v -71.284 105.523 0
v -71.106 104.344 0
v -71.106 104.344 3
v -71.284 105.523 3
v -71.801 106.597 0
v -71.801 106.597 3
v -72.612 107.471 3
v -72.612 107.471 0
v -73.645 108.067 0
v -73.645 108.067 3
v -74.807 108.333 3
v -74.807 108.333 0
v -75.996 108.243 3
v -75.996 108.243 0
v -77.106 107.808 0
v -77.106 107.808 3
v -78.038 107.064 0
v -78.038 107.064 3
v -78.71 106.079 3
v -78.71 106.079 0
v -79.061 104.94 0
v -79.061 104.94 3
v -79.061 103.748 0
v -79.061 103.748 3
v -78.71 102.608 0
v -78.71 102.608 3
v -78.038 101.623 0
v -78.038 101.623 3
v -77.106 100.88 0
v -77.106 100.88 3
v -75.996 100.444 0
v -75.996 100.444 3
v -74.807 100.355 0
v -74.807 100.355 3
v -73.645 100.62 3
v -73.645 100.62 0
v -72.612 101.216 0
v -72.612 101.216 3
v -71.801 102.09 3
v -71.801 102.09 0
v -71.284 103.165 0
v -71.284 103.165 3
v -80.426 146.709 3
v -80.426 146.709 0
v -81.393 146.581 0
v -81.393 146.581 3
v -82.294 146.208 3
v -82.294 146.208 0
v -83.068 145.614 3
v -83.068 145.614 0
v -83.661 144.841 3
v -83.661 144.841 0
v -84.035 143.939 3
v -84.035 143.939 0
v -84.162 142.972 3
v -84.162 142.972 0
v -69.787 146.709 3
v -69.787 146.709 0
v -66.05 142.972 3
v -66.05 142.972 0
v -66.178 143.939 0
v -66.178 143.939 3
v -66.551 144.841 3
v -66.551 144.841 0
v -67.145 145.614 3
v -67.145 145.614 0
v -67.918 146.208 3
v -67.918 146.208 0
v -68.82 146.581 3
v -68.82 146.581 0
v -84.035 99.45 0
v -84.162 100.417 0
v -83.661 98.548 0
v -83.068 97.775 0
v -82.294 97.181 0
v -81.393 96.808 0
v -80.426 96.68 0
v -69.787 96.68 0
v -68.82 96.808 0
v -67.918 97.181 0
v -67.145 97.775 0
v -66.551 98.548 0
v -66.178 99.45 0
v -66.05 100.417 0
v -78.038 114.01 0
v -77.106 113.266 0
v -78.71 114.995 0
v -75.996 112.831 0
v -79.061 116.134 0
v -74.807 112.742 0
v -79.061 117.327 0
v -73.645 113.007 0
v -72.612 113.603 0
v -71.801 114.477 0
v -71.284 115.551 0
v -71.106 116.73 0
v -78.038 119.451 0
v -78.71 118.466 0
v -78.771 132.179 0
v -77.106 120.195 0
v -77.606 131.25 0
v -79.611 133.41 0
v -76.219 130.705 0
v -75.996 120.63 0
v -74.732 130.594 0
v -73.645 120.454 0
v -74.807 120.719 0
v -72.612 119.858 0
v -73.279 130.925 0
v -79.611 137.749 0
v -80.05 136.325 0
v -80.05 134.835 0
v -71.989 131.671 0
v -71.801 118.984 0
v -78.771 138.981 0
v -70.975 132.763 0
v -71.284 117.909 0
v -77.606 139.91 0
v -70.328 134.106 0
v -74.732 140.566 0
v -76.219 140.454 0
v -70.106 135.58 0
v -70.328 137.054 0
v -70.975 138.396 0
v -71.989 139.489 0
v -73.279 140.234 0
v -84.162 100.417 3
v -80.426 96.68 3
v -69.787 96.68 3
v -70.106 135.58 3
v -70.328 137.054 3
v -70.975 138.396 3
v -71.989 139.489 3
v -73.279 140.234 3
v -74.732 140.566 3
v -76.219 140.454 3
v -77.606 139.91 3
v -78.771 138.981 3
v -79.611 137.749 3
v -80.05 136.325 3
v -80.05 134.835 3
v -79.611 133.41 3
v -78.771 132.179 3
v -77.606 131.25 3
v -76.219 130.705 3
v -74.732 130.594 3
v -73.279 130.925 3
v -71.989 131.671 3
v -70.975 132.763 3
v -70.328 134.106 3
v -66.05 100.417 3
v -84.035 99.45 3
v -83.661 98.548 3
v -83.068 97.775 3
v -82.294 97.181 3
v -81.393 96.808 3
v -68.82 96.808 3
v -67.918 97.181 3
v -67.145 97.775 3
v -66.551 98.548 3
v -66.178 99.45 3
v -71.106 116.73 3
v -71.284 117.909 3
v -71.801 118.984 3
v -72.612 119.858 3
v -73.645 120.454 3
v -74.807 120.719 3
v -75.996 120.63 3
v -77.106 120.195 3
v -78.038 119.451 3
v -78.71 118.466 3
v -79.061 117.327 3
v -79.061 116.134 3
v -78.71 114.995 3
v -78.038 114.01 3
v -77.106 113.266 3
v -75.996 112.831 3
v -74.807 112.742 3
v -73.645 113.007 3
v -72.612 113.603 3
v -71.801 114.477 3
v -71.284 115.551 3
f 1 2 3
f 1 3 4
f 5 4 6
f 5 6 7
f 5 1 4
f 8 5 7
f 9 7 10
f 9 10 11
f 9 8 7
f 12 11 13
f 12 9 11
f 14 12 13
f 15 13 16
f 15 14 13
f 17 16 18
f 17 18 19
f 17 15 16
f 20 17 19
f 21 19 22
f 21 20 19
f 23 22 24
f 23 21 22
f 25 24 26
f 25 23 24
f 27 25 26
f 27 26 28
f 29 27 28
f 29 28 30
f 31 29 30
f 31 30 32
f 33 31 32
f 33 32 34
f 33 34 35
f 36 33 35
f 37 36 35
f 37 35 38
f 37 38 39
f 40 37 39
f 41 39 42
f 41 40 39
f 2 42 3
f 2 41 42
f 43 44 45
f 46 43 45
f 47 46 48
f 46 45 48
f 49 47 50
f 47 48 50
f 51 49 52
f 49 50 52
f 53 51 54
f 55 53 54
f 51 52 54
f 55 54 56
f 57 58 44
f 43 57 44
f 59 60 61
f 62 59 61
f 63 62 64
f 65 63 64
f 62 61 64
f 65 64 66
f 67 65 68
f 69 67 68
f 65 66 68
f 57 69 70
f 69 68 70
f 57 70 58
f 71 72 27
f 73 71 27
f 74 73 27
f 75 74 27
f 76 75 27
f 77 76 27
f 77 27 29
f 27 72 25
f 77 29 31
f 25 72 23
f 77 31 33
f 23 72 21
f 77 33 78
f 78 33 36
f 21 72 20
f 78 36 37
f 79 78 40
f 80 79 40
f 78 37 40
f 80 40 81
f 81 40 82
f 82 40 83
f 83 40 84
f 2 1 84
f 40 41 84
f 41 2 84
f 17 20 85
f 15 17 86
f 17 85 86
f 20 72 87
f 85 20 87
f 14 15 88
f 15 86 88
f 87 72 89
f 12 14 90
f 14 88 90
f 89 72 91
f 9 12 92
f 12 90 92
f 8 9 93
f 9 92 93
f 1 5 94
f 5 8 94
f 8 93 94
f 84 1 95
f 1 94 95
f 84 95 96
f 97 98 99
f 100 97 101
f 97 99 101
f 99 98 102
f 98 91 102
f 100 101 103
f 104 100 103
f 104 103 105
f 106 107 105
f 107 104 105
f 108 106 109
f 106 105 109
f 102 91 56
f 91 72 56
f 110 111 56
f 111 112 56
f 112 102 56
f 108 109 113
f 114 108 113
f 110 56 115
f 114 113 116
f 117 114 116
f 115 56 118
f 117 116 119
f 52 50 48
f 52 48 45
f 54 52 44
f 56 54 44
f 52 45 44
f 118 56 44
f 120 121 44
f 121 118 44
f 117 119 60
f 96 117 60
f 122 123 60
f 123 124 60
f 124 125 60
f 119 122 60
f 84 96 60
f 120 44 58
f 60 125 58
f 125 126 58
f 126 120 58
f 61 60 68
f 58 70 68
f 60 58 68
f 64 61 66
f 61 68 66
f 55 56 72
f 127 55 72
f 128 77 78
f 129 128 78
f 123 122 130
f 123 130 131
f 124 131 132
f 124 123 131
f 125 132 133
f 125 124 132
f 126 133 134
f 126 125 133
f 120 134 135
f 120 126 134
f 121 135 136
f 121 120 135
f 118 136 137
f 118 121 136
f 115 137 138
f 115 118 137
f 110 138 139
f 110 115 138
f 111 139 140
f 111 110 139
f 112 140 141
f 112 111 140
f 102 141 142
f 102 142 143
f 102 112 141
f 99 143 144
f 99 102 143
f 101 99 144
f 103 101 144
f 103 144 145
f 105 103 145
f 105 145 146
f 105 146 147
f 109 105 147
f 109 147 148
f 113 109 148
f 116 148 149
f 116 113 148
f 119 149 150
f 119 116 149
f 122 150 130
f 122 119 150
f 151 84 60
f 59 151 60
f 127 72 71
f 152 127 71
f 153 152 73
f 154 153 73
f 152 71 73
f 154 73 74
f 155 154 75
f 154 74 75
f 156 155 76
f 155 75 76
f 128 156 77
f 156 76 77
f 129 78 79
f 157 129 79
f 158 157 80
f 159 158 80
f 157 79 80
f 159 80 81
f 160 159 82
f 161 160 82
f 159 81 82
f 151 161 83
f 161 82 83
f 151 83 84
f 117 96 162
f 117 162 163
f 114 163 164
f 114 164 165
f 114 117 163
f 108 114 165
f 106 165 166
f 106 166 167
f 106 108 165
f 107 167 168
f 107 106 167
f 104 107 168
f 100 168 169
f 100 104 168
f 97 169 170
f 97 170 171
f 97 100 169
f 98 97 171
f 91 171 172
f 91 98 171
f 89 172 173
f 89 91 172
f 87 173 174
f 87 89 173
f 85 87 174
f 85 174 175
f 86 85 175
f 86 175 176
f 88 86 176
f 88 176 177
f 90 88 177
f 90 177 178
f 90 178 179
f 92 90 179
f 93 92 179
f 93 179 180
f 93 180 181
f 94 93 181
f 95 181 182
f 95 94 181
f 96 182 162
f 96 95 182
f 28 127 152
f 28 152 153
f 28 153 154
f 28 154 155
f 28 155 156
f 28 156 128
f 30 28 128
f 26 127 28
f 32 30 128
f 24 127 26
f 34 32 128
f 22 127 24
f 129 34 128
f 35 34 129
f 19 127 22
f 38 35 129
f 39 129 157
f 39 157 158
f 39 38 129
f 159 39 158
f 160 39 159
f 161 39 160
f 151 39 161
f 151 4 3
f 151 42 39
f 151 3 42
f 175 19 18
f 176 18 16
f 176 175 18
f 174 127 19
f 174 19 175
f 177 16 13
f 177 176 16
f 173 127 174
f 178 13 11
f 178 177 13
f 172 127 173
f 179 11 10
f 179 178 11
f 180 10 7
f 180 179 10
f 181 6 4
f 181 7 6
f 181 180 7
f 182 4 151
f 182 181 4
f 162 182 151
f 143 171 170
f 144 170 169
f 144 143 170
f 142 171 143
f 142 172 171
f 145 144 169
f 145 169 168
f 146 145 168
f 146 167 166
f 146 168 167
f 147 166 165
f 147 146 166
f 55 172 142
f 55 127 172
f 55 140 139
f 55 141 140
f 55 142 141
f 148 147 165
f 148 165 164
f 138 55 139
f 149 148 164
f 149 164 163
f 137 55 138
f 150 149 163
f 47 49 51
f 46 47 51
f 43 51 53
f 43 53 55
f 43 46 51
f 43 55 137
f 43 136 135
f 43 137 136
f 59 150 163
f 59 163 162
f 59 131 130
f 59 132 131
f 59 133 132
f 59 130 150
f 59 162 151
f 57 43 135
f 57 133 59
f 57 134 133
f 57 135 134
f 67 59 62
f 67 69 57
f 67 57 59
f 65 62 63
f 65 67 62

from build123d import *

# Parameters (mm, degrees)
SKETCH1_R           = 4
SKETCH1_R_2         = 5
BOSS_EXTRUDE1_DEPTH = 3


with BuildPart() as part:
    # Sketch1 → Boss-Extrude1 (new body)
    with BuildSketch(Plane.XY):
        with BuildLine():
            Line((-80.425564374, 96.680246319), (-69.786632227, 96.680246319))
            ThreePointArc((-69.786632227, 96.680246319), (-67.144628902, 97.774599928), (-66.050275293, 100.416603253))
            Line((-66.050275293, 100.416603253), (-66.050275293, 142.972331842))
            ThreePointArc((-66.050275293, 142.972331842), (-67.144628902, 145.614335167), (-69.786632227, 146.708688776))
            Line((-69.786632227, 146.708688776), (-80.425564374, 146.708688776))
            ThreePointArc((-80.425564374, 146.708688776), (-83.067567699, 145.614335167), (-84.161921308, 142.972331842))
            Line((-84.161921308, 142.972331842), (-84.161921308, 100.416603253))
            ThreePointArc((-84.161921308, 100.416603253), (-83.067567699, 97.774599928), (-80.425564374, 96.680246319))
        make_face()
        with Locations((-75.106098301, 104.343716036)):
            Circle(SKETCH1_R, mode=Mode.SUBTRACT)
        with Locations((-75.106098301, 116.730443274)):
            Circle(SKETCH1_R, mode=Mode.SUBTRACT)
        with Locations((-75.106098301, 135.57981081)):
            Circle(SKETCH1_R_2, mode=Mode.SUBTRACT)
    extrude(amount=BOSS_EXTRUDE1_DEPTH)


solid = part.part
